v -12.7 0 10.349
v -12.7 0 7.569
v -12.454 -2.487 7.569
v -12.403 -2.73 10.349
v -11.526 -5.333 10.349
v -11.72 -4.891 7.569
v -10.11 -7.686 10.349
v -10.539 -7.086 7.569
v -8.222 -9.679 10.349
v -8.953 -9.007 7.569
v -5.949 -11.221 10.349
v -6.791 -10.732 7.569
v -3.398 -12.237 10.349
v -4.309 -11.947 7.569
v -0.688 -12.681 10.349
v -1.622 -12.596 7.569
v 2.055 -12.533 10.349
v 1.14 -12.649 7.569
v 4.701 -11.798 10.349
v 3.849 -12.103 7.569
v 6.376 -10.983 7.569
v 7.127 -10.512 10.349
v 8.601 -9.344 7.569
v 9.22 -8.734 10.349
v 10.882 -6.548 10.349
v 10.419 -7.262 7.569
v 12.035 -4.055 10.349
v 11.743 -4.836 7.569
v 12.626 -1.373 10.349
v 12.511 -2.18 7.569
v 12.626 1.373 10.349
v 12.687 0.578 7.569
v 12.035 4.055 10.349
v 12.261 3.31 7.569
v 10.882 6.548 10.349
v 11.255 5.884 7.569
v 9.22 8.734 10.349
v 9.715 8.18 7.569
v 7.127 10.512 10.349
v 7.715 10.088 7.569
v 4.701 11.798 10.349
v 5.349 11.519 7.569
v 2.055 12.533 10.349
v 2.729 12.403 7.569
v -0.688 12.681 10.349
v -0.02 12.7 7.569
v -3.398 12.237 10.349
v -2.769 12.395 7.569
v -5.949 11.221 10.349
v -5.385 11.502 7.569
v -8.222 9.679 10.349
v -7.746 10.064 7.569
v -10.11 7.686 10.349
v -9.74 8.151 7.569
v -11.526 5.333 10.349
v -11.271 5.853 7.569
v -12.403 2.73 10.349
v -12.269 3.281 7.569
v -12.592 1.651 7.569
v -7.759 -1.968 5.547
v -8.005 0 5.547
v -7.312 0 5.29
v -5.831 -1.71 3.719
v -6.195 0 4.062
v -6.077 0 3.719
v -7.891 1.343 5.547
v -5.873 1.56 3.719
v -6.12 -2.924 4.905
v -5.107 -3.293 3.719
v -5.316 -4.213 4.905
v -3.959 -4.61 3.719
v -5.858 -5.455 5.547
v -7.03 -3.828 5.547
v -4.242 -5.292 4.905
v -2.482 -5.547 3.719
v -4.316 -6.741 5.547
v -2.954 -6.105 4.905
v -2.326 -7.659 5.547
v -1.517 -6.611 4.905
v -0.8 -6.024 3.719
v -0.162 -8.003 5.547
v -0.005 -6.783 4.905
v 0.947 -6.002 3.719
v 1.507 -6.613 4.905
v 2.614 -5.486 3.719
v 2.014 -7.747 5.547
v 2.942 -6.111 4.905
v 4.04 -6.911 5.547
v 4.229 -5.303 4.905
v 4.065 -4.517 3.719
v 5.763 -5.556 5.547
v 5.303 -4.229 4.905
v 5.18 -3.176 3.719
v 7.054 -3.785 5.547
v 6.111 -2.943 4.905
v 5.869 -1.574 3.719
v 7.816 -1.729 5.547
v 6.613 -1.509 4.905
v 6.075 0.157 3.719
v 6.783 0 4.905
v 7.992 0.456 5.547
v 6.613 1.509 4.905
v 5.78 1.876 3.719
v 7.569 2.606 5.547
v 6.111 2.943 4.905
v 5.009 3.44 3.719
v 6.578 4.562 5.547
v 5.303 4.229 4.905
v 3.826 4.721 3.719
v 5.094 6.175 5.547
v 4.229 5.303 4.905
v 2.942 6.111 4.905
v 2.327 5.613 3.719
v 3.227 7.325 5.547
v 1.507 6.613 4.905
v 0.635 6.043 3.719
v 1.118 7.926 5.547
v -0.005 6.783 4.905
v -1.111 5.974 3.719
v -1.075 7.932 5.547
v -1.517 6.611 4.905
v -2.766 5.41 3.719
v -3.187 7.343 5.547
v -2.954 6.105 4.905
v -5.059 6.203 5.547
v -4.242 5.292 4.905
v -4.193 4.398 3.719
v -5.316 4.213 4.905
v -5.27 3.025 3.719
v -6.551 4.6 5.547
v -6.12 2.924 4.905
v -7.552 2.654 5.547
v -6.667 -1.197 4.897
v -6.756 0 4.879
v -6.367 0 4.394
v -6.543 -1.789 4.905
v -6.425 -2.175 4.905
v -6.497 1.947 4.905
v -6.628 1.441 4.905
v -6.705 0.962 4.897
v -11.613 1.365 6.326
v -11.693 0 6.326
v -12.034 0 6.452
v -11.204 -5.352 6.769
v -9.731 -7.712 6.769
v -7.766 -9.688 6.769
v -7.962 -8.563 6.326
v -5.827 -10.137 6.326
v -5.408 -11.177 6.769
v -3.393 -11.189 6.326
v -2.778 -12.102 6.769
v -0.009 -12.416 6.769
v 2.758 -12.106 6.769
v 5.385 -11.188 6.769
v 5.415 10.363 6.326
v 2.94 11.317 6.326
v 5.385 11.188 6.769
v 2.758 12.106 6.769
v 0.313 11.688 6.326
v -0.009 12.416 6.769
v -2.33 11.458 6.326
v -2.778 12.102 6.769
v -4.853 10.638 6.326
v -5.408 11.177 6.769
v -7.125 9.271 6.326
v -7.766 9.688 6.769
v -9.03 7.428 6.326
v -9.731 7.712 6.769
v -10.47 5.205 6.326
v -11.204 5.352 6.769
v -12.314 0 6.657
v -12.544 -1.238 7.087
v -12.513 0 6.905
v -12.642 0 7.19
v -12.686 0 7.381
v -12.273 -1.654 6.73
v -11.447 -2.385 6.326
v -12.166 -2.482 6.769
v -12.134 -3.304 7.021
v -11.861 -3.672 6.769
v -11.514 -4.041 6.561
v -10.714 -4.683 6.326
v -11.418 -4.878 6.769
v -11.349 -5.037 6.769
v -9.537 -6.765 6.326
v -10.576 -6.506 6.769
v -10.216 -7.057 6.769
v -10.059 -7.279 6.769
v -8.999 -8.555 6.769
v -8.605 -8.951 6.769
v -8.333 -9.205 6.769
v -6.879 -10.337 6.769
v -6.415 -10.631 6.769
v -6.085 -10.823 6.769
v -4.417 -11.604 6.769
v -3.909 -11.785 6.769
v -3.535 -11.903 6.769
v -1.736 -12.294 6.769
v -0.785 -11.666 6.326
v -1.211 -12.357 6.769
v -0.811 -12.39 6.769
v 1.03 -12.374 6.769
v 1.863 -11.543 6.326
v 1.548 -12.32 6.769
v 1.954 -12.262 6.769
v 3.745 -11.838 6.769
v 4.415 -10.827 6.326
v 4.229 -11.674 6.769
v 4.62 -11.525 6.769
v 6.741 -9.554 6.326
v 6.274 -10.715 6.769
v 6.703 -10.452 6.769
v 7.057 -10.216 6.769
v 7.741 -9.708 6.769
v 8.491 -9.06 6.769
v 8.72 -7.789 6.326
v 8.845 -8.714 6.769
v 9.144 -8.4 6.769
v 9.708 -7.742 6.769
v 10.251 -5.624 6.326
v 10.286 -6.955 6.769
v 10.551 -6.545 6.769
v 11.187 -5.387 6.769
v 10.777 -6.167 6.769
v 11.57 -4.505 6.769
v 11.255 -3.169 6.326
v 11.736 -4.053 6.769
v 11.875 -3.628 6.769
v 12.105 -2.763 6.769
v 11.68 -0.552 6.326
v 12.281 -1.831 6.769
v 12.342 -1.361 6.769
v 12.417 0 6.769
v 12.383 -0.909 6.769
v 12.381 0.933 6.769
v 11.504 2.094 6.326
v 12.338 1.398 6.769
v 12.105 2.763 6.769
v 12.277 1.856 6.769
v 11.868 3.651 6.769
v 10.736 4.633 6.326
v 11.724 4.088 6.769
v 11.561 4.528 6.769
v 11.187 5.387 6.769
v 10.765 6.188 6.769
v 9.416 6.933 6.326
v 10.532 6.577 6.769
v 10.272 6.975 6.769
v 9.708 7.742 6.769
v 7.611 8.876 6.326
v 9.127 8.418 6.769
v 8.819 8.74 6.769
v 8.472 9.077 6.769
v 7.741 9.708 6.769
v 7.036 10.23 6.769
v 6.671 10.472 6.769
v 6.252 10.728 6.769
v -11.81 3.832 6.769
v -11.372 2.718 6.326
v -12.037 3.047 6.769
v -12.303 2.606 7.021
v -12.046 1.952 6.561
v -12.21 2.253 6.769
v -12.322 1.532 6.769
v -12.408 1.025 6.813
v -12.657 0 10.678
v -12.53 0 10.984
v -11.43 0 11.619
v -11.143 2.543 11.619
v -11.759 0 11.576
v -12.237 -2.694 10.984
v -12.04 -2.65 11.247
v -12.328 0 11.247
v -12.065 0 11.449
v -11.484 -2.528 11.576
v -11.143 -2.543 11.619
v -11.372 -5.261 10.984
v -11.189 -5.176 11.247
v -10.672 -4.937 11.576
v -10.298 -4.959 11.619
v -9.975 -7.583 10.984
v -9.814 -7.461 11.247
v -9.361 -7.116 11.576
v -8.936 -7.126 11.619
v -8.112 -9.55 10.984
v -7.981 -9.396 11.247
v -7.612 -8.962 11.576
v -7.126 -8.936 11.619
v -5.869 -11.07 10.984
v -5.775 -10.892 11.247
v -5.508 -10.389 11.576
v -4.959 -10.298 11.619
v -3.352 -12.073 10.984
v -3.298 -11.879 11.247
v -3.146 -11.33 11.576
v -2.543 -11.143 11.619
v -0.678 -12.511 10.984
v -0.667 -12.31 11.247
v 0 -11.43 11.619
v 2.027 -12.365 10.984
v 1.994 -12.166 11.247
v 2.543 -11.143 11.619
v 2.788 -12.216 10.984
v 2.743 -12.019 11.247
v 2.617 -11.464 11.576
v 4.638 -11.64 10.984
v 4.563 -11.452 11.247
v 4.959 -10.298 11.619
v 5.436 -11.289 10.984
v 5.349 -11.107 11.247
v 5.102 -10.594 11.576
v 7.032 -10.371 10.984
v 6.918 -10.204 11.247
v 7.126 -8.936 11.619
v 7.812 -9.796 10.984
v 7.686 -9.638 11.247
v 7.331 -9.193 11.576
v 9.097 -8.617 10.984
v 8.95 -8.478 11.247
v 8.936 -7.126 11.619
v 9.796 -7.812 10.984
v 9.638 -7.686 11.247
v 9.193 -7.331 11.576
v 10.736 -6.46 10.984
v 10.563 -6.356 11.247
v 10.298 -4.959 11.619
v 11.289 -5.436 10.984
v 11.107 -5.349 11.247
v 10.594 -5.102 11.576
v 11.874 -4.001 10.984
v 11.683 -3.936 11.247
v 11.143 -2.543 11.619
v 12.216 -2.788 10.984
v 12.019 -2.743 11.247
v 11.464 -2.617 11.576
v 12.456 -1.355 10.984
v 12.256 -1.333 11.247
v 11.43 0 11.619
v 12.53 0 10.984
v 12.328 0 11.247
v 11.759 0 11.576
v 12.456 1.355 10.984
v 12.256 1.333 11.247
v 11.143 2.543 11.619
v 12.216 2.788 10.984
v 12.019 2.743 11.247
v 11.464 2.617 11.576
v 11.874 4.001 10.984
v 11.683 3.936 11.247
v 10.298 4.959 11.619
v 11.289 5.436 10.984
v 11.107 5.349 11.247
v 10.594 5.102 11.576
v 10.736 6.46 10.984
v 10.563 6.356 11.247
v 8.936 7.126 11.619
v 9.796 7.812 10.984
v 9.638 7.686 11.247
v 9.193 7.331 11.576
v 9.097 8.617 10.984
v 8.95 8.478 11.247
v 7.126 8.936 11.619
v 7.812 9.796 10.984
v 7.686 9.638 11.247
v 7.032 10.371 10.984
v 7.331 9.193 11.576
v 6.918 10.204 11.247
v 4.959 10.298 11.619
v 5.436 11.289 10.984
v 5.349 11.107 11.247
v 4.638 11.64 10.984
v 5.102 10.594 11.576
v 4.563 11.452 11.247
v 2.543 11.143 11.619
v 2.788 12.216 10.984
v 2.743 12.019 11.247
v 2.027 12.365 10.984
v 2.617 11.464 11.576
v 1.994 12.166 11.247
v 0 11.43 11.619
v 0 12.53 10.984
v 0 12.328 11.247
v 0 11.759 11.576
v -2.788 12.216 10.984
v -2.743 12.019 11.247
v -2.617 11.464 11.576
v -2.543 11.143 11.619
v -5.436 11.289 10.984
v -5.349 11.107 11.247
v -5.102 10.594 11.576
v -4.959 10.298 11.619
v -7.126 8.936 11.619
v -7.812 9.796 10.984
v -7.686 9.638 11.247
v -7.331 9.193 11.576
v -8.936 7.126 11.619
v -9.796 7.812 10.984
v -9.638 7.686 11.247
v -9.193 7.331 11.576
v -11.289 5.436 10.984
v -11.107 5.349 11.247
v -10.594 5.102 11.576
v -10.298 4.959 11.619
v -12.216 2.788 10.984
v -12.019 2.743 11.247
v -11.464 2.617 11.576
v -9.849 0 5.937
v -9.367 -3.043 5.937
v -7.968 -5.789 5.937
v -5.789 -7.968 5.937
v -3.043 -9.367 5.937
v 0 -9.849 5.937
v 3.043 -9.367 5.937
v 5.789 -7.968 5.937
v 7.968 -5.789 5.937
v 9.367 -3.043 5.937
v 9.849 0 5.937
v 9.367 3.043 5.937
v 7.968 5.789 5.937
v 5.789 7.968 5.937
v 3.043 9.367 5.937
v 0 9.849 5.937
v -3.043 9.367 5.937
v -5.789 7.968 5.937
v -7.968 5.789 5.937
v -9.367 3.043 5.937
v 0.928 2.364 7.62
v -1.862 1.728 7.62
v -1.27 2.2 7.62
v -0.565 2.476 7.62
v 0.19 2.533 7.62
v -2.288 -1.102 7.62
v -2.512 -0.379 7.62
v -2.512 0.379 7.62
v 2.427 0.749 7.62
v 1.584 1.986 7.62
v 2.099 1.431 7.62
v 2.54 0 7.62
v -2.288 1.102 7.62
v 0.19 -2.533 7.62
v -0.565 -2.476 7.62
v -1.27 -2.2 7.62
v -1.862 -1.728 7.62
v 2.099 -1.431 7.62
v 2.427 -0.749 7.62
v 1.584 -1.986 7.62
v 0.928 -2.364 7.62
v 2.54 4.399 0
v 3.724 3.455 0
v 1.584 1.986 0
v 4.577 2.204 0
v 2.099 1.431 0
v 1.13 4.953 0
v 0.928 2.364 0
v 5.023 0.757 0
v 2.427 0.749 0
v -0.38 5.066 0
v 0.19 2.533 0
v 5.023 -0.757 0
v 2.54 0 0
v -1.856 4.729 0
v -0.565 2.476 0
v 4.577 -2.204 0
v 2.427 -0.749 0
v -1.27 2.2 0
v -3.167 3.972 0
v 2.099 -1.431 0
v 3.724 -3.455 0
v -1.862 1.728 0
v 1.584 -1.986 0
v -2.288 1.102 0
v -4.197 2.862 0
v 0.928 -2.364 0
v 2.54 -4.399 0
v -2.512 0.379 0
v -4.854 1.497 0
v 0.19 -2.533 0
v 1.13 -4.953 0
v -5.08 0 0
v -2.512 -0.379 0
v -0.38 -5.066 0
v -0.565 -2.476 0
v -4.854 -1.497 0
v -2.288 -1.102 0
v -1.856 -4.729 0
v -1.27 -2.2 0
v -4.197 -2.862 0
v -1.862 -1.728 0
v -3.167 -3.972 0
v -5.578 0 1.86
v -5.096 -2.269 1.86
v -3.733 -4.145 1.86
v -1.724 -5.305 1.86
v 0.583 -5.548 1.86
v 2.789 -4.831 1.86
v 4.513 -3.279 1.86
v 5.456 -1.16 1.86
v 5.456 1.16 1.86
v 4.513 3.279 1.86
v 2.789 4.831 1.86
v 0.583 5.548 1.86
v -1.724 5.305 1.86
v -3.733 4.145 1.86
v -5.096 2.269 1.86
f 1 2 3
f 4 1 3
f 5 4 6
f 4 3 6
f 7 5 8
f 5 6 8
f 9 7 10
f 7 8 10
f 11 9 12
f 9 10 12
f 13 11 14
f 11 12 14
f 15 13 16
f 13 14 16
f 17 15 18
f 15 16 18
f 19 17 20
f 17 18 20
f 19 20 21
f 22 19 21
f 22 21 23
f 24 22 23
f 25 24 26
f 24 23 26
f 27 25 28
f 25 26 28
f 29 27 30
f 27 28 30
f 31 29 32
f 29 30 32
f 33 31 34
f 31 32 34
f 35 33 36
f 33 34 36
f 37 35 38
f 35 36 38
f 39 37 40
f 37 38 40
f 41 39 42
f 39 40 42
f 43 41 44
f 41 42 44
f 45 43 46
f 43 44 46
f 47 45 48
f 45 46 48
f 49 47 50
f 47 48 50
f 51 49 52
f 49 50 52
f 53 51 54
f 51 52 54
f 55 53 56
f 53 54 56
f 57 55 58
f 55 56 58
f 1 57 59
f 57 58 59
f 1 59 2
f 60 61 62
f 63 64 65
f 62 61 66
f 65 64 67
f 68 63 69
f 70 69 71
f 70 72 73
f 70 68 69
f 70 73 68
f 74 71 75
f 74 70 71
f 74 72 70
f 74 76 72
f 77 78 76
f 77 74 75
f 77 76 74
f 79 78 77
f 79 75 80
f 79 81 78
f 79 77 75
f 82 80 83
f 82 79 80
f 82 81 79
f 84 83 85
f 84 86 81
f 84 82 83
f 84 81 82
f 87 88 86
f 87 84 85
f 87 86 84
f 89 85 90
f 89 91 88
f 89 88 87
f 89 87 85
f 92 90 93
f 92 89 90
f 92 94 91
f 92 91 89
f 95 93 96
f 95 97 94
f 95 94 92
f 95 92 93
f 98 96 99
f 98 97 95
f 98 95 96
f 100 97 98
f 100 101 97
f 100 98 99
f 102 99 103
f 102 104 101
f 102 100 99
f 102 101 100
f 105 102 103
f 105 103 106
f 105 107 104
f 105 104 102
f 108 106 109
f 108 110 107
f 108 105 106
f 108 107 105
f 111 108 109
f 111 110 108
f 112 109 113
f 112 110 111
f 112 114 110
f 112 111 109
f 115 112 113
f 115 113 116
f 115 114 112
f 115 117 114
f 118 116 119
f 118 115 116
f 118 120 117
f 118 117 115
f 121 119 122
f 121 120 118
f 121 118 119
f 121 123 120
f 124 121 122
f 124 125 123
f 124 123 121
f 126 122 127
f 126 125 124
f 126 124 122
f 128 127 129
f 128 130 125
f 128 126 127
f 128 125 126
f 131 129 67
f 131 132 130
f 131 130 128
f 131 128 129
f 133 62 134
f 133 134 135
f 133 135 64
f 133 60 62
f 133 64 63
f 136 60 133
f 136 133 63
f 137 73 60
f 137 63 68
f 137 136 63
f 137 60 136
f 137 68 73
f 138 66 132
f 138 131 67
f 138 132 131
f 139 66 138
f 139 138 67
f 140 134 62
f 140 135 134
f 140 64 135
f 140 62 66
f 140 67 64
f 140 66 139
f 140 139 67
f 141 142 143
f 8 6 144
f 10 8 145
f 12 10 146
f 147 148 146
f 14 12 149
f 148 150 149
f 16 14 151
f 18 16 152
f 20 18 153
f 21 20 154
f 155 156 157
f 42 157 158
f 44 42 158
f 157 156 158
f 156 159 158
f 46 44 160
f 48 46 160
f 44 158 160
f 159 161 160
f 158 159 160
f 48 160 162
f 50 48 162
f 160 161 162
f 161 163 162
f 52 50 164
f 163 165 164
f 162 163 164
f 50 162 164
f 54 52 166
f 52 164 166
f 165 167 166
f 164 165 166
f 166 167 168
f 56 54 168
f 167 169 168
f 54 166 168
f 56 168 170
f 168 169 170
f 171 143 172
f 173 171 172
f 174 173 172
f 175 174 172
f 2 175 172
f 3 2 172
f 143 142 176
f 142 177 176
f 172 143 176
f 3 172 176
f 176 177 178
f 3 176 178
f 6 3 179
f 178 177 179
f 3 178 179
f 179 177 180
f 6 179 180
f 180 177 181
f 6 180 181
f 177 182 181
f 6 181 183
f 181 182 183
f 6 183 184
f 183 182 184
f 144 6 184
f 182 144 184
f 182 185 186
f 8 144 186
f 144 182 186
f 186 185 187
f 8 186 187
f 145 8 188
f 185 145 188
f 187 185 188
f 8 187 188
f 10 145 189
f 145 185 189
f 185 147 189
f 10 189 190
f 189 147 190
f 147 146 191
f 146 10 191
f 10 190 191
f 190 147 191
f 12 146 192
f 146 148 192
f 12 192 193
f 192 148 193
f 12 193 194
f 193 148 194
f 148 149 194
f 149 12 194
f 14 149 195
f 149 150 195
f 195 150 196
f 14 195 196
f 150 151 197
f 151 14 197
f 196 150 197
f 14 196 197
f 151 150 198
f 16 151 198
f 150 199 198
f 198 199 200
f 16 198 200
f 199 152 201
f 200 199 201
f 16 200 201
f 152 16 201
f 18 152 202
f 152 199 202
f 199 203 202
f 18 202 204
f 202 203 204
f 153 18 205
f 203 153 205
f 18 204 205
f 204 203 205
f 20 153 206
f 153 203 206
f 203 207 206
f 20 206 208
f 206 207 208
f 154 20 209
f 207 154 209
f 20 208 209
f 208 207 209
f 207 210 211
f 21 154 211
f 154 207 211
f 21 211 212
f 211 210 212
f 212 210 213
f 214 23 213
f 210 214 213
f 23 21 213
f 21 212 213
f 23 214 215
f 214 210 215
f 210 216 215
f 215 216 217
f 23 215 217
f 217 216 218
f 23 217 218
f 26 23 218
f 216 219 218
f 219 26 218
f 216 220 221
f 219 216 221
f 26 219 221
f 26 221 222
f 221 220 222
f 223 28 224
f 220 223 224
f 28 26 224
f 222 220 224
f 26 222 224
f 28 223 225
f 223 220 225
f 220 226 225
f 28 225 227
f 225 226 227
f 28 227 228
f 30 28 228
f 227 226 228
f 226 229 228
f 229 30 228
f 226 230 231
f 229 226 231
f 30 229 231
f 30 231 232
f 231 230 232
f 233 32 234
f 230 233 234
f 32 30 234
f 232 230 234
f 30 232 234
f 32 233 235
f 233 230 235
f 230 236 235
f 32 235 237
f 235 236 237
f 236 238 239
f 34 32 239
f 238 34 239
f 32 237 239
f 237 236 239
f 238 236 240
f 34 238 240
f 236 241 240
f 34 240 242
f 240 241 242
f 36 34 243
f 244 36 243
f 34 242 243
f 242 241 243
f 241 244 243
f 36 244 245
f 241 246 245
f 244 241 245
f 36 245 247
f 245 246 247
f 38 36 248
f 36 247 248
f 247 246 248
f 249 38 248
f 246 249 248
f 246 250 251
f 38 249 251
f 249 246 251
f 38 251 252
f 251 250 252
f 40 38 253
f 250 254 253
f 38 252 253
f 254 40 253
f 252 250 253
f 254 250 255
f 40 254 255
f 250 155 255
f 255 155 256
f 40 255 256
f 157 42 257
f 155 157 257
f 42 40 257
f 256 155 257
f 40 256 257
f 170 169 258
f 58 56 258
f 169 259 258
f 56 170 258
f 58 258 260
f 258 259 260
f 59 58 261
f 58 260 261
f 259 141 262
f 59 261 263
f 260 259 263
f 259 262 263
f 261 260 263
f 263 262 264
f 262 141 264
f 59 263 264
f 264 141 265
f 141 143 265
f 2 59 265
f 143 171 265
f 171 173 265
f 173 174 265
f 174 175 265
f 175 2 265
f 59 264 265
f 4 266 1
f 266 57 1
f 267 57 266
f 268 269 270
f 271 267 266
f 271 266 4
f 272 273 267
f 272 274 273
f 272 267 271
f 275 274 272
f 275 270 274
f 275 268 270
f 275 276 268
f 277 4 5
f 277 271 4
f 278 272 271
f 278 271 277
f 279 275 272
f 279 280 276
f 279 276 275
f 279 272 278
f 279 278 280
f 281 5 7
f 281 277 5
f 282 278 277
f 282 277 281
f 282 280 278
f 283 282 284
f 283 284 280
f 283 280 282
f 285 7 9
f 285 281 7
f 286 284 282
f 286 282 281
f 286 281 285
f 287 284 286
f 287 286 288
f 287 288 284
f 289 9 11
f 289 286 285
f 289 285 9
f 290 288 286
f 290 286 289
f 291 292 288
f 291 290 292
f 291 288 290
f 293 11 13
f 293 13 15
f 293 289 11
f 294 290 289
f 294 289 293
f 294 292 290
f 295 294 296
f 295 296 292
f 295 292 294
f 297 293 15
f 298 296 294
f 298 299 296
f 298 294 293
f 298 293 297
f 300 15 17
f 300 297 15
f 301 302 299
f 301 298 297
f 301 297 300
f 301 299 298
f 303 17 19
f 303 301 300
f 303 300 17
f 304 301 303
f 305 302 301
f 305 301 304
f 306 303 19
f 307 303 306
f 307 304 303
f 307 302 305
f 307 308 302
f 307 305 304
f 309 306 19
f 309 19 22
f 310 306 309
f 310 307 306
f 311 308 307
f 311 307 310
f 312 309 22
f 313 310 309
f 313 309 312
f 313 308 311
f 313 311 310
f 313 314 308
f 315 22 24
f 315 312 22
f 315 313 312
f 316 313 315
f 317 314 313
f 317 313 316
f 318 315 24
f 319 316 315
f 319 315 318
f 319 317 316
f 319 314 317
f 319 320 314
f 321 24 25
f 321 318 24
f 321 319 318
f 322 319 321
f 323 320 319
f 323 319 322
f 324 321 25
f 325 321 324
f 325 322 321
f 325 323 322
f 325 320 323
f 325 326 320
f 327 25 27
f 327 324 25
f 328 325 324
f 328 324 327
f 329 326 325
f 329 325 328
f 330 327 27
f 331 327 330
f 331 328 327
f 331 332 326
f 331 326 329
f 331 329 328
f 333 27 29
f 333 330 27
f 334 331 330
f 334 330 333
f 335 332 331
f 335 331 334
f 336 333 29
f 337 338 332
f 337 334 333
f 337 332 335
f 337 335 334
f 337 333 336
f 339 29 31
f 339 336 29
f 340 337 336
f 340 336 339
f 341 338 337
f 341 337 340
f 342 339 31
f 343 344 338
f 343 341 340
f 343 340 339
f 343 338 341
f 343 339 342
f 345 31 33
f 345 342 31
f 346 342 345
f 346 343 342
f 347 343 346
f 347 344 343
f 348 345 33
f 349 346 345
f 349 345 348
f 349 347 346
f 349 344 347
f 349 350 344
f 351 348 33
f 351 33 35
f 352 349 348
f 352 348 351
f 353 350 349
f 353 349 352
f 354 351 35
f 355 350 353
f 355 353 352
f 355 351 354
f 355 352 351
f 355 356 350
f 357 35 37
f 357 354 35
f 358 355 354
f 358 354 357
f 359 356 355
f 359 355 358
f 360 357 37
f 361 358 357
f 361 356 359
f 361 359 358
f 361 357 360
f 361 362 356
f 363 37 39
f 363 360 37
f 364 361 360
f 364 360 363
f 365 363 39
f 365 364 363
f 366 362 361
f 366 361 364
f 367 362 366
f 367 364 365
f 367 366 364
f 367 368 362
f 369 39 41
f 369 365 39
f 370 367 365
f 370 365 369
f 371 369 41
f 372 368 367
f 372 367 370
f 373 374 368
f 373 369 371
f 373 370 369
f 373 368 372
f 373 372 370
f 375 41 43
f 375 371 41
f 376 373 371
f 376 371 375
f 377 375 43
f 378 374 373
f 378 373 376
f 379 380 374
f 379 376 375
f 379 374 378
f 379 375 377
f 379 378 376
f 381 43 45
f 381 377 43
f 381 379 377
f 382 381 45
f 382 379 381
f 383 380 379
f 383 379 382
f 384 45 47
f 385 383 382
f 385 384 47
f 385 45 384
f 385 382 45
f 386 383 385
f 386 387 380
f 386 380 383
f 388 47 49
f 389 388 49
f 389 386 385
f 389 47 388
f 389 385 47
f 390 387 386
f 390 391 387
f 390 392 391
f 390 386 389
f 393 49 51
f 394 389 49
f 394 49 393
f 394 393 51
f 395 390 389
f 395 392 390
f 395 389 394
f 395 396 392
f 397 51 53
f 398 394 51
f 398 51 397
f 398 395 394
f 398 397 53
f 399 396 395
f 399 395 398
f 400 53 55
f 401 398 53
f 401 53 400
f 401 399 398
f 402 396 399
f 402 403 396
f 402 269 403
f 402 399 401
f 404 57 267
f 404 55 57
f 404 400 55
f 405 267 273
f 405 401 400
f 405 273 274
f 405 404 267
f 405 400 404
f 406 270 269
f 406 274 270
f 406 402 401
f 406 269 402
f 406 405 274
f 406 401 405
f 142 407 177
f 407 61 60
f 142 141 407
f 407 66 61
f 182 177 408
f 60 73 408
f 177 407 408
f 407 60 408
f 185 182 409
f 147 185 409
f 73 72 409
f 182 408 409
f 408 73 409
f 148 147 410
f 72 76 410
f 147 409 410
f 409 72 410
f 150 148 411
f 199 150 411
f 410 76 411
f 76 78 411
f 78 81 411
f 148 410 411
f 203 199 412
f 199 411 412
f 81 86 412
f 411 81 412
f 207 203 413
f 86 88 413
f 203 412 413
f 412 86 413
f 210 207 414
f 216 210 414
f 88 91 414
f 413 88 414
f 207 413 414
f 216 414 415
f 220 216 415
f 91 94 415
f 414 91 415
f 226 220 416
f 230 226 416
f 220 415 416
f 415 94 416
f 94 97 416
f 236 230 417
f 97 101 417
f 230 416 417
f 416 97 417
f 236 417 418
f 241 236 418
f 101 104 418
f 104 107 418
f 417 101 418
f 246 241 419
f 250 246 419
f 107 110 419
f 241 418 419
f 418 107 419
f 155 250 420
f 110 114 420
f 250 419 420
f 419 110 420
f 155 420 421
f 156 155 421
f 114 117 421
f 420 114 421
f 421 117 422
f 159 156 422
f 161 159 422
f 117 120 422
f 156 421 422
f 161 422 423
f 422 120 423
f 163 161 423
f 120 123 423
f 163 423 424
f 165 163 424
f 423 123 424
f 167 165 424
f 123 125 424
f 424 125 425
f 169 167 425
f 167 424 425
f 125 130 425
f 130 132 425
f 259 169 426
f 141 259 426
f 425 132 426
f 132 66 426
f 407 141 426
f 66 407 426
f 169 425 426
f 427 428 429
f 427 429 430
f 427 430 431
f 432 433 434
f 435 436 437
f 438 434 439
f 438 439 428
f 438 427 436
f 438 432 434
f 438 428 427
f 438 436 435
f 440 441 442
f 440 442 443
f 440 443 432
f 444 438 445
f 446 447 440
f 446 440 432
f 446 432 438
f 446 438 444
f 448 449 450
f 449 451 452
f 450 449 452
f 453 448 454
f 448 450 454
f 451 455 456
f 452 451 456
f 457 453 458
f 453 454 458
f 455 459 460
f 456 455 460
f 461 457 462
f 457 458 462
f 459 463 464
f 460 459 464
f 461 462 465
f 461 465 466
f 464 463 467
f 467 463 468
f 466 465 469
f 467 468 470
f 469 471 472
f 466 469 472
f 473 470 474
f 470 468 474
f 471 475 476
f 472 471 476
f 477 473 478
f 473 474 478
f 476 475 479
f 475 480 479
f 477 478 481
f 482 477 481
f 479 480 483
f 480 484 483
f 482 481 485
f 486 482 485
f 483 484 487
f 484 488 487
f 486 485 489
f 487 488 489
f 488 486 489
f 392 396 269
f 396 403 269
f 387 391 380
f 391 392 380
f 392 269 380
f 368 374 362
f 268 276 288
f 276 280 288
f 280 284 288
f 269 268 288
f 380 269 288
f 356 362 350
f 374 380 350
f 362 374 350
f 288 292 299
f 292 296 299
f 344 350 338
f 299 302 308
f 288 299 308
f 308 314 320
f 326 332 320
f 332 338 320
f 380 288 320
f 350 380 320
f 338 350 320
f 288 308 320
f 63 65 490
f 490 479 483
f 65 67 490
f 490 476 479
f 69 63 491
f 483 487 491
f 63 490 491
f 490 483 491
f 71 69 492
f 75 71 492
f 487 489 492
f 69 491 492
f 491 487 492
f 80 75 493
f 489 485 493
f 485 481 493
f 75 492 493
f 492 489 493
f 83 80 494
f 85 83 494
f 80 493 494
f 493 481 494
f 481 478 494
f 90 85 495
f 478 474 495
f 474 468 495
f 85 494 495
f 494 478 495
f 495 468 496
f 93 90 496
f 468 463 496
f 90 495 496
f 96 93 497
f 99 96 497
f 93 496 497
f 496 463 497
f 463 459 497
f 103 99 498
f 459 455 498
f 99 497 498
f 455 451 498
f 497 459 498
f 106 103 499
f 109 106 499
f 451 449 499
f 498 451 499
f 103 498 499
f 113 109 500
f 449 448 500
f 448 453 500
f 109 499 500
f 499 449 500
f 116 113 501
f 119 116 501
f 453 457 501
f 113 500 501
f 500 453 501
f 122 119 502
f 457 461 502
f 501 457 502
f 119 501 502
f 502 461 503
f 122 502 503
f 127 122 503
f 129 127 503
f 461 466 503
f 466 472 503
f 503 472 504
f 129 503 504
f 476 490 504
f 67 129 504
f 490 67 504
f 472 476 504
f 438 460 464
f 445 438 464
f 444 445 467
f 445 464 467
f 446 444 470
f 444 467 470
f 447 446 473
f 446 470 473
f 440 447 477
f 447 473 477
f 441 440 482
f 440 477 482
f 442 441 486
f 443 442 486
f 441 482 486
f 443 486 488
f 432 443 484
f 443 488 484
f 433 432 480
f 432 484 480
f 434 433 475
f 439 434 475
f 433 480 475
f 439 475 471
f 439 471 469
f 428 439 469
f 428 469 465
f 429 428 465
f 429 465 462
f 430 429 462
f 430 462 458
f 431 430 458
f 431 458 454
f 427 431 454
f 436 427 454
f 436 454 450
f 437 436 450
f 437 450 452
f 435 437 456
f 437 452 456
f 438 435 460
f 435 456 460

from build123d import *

# Parameters (mm, degrees)
F2_R     = 2.54
F3_R     = 1.27
F4_R     = 2.54
F5_DEPTH = 7.62


with BuildPart() as f1:
    # F0 (on Front) → F1 (revolve)
    with BuildSketch(Plane.XZ):
        Polygon((0, 11.619149), (-12.7, 11.619149), (-12.7, 6.539149), (-6.479921, 5.224574), (-5.08, 0), (0, 0), align=None)
    revolve(axis=Axis((0, 0, 5.809575), (0, 0, 1)))

    # F2
    f2_edges = [f1.edges().sort_by_distance(p)[0] for p in [
        (6.479921, 0, 5.224574),
    ]]
    fillet(f2_edges, radius=F2_R)

    # F3
    f3_edges = [f1.edges().sort_by_distance(p)[0] for p in [
        (12.7, 0, 11.619149),
        (12.7, 0, 6.539149),
    ]]
    fillet(f3_edges, radius=F3_R)

    # F4 (on face) → F5 (cut)
    with BuildSketch(Plane(origin=(0, 0, 0), x_dir=(1, 0, 0), z_dir=(0, 0, -1))):
        Circle(F4_R)
    extrude(amount=-F5_DEPTH, mode=Mode.SUBTRACT)


solid = f1.part
